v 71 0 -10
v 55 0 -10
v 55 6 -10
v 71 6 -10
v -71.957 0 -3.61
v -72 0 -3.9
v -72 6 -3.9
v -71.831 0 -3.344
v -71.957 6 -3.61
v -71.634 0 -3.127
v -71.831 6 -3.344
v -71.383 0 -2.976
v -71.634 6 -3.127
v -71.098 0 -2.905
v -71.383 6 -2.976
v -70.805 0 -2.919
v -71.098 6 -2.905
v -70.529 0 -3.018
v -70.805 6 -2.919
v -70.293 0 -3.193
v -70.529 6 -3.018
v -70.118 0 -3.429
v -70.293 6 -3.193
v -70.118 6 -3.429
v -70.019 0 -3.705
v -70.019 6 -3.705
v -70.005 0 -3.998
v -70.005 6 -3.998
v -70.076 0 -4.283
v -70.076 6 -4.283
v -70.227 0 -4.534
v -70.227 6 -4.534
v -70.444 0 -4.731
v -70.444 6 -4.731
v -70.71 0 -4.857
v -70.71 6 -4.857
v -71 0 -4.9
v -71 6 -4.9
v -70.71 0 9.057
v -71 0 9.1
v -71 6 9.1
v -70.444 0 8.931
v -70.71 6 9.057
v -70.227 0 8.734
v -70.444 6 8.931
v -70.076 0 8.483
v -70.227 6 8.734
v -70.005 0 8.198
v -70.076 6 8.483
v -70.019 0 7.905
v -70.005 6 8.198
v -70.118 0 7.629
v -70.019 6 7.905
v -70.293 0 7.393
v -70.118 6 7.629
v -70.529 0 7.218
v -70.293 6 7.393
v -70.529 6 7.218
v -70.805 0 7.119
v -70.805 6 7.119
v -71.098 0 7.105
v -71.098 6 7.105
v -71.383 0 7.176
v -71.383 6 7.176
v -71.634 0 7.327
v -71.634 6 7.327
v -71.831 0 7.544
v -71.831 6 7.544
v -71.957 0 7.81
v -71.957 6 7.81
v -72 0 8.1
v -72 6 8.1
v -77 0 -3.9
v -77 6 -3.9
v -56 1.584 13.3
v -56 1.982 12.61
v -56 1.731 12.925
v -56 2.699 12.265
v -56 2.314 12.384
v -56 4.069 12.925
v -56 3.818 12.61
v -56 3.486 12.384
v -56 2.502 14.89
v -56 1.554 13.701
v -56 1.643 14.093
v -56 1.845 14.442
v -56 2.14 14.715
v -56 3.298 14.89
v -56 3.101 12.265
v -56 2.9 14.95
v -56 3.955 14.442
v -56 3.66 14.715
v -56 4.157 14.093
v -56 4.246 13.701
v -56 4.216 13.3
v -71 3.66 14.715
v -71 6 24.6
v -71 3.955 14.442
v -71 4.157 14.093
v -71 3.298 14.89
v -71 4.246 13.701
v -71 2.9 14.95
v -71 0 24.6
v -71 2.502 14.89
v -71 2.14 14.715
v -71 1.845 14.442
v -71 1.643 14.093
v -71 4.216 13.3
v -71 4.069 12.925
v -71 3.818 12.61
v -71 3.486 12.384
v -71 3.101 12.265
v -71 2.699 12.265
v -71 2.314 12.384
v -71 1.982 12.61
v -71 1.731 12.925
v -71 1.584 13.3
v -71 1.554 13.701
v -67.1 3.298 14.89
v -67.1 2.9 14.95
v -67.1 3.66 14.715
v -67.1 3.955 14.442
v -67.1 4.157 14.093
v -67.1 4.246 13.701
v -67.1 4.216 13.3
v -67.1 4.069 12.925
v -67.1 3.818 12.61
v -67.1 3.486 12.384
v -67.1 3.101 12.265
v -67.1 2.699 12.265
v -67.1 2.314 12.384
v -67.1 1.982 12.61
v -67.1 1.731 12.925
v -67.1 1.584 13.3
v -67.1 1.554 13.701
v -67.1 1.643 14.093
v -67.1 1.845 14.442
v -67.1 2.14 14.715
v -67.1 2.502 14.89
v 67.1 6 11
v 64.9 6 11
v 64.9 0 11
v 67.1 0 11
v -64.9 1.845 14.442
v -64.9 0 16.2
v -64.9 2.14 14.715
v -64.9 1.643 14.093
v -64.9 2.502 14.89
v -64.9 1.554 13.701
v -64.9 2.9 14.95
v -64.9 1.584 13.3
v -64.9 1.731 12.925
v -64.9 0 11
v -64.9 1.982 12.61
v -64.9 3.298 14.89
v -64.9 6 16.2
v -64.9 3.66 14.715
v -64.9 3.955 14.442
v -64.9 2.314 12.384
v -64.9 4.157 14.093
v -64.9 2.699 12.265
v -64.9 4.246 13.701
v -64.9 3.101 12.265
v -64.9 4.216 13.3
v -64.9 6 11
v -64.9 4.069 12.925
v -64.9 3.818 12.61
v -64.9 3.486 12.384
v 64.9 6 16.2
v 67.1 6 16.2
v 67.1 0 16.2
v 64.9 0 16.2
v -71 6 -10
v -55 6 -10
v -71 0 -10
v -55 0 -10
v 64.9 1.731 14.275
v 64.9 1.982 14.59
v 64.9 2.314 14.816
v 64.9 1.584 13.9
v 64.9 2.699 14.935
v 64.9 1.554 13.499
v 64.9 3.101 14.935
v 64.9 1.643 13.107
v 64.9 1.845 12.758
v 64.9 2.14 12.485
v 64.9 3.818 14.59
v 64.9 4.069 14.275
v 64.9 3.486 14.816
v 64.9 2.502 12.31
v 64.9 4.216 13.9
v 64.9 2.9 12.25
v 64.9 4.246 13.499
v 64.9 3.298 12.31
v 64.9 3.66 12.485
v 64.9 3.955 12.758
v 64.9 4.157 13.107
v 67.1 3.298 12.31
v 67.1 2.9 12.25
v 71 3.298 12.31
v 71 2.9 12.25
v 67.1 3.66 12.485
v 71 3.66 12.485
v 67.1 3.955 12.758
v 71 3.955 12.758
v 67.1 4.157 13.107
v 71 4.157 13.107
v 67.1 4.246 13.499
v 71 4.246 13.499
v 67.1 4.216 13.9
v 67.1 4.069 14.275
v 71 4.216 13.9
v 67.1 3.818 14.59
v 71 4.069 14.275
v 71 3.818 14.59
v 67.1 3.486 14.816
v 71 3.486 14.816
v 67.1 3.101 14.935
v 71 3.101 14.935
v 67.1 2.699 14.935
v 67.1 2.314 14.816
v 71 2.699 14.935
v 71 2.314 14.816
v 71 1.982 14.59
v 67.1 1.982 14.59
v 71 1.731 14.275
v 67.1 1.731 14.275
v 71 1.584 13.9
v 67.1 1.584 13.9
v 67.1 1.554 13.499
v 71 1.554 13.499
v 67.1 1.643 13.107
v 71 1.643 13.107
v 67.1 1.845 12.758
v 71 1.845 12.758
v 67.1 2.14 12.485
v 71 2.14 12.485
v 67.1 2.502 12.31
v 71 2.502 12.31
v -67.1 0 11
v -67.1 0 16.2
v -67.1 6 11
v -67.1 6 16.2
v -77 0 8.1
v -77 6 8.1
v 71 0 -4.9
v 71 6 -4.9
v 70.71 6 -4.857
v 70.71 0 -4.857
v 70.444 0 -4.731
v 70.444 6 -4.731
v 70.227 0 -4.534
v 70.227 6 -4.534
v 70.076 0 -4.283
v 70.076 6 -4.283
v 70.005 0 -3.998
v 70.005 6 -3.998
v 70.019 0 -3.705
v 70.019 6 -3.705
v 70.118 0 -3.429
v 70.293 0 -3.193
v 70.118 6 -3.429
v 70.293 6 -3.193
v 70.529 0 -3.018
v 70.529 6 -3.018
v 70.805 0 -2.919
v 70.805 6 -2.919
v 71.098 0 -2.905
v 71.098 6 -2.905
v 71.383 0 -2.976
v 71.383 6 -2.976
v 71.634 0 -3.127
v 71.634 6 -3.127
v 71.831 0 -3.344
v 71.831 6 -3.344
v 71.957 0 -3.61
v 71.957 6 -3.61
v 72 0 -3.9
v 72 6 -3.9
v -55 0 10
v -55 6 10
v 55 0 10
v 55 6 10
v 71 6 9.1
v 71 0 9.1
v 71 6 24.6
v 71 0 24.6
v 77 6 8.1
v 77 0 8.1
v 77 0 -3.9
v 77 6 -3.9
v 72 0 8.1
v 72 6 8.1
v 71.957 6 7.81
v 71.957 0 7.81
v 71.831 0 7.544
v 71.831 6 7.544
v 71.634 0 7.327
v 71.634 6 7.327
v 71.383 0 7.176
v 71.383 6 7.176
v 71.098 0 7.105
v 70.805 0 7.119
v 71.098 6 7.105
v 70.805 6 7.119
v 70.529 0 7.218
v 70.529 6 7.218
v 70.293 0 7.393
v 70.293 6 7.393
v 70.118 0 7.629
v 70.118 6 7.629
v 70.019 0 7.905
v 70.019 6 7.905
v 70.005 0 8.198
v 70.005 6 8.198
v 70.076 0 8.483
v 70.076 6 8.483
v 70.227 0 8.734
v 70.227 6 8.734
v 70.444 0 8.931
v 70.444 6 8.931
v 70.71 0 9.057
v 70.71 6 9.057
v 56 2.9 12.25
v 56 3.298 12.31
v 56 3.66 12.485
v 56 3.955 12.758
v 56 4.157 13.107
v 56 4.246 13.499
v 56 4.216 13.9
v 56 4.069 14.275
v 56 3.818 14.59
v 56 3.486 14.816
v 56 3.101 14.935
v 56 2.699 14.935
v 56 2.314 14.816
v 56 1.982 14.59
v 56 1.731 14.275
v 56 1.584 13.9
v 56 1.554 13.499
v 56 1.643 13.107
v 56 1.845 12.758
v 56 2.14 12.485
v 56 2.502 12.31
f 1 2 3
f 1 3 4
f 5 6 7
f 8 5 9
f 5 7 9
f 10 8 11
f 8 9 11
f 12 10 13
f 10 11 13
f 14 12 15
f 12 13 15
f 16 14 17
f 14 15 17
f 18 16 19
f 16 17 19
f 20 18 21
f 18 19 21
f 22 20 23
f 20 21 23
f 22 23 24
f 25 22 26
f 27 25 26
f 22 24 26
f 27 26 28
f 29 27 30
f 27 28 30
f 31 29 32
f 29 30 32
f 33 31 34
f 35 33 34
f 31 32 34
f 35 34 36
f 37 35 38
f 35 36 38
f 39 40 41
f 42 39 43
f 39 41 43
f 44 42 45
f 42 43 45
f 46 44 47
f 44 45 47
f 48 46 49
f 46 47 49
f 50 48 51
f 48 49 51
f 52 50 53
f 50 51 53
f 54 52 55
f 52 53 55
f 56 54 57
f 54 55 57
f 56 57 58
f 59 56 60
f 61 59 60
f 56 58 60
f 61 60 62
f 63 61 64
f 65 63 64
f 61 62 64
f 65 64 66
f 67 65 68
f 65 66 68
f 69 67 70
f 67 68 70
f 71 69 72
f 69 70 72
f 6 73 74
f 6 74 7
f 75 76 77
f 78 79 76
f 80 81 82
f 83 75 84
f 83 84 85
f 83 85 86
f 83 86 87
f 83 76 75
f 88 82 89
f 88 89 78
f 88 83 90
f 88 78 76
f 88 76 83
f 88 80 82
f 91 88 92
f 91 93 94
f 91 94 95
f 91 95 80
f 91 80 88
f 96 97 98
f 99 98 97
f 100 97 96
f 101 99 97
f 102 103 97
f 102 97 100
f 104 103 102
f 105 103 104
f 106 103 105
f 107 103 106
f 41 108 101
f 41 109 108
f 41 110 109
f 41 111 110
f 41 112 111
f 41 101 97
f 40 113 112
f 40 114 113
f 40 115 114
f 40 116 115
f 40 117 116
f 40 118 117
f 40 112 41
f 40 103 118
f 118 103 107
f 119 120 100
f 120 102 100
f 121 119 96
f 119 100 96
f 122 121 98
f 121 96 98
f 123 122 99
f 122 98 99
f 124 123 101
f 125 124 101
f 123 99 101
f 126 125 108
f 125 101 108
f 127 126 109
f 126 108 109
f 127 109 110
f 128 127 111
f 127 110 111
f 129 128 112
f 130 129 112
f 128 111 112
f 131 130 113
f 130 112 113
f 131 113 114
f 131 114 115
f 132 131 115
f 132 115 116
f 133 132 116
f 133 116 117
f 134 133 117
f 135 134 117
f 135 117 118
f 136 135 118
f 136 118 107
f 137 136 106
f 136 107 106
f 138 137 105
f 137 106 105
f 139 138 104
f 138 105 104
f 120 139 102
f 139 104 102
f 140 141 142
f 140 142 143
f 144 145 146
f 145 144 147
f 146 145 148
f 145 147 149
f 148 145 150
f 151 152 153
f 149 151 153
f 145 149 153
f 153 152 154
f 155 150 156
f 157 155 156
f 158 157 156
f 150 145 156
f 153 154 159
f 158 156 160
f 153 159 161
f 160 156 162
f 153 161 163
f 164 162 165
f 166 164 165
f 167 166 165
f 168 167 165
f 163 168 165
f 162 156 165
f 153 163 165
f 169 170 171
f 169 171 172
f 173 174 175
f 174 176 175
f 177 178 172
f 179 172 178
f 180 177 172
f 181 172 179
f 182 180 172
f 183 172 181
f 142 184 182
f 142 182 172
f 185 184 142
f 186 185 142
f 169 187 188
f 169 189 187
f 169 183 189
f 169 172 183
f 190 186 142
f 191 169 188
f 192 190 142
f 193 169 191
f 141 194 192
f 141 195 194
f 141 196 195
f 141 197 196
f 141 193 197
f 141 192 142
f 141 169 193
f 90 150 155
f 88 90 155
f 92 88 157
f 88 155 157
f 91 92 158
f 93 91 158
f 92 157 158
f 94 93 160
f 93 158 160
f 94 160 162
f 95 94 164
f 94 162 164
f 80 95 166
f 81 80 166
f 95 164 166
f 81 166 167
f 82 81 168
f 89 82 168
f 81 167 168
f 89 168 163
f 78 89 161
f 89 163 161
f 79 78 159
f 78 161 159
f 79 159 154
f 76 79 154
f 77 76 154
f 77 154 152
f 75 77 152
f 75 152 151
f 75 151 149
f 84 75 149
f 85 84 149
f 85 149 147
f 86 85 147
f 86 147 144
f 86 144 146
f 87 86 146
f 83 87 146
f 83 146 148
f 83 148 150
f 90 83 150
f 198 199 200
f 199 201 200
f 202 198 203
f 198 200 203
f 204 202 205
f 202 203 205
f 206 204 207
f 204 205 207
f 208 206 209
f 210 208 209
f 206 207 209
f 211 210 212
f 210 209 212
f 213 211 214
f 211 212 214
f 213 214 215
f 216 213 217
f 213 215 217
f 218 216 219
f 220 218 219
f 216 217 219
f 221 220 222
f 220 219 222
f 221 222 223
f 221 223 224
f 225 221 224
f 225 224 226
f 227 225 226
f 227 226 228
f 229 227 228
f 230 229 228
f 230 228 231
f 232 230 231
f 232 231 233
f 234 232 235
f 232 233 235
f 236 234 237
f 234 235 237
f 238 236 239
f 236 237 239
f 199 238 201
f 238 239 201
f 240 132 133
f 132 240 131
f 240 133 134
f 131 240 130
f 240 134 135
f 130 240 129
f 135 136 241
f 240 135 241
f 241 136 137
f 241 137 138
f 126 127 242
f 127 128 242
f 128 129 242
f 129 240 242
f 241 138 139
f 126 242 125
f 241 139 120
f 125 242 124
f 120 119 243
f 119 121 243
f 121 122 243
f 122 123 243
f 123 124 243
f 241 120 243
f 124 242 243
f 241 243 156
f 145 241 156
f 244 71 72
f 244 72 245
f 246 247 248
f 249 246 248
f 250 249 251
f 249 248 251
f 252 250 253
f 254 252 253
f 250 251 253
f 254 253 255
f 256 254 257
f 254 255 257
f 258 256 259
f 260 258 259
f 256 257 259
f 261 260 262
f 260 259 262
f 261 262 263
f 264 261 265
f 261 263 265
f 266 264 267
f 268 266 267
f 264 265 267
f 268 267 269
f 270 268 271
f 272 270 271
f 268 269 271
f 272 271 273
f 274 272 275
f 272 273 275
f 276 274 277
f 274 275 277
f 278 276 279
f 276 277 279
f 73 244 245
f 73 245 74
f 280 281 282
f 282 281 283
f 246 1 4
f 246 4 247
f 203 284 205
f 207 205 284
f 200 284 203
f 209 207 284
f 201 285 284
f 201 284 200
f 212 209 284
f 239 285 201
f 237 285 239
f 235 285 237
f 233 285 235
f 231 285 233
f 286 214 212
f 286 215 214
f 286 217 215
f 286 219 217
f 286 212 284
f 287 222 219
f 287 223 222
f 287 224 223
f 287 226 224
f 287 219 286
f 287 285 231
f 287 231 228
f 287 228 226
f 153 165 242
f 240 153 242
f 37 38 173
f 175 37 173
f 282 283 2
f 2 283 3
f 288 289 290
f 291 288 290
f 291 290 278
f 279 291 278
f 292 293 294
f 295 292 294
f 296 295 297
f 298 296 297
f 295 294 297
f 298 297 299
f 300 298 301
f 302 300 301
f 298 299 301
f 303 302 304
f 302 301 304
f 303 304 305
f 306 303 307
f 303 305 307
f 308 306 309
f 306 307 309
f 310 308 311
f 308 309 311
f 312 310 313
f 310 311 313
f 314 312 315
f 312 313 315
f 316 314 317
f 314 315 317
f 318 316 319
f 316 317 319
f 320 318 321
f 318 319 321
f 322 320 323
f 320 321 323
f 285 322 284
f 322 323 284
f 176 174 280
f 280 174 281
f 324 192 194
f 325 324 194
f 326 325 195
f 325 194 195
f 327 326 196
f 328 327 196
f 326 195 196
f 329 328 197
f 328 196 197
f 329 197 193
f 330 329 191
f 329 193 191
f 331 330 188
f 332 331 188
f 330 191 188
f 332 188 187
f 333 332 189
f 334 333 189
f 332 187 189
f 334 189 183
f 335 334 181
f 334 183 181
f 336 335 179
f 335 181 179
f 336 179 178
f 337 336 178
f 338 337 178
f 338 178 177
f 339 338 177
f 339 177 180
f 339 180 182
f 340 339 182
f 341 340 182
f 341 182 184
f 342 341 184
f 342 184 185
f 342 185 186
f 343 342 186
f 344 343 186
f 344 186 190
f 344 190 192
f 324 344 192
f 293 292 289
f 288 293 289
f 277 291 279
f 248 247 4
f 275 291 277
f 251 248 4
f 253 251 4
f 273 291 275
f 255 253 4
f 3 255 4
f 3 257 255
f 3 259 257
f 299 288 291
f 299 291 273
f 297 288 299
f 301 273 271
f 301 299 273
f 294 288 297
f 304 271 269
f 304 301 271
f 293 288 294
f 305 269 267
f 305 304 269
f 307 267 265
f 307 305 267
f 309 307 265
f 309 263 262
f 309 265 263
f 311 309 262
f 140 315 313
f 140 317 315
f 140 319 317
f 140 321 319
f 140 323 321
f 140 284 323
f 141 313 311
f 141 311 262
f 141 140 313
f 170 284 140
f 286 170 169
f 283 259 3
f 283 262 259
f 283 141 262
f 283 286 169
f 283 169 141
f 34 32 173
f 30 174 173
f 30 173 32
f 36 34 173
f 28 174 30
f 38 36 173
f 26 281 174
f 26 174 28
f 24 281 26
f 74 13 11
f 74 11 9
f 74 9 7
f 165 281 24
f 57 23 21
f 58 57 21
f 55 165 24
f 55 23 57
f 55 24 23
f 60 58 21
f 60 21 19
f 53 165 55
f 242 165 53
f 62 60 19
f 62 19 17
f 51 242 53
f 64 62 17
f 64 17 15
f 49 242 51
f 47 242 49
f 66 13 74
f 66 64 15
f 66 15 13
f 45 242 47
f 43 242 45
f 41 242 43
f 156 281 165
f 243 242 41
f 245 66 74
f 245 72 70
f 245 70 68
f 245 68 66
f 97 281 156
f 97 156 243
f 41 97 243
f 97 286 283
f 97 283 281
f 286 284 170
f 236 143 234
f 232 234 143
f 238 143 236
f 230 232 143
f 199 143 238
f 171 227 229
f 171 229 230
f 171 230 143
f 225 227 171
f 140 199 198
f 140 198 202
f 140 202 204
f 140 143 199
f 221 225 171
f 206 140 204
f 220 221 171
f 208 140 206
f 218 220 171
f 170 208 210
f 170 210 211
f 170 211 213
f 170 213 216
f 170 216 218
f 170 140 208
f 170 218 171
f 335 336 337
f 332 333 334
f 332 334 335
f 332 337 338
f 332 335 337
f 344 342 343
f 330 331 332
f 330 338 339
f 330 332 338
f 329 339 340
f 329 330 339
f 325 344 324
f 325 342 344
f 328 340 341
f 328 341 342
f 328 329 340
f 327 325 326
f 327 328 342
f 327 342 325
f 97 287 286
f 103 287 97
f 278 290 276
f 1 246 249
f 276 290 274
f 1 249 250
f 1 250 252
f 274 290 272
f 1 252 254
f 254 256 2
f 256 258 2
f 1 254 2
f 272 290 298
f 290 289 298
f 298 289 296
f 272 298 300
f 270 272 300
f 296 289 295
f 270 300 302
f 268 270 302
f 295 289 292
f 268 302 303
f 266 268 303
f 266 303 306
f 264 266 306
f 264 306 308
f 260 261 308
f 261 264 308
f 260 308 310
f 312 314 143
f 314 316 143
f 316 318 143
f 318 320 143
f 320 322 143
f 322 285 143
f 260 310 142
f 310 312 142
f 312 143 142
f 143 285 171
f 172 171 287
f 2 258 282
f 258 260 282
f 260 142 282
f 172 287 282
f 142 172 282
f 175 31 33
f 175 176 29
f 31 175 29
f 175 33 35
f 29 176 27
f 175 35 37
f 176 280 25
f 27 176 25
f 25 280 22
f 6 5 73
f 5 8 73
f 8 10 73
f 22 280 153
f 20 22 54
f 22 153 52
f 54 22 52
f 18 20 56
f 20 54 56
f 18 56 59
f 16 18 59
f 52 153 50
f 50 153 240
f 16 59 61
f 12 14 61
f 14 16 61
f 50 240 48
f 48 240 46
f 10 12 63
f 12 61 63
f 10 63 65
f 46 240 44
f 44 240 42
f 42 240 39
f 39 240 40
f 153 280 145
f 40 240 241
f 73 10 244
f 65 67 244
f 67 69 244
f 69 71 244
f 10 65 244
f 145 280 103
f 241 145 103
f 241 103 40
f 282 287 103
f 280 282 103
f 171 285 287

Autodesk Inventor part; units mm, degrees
ref_plane "우측면도" through (0, 0, 0) normal (1, 0, 0) x (0, 1, 0)
ref_plane "평면도" through (0, 0, 0) normal (0, 1, 0) x (-1, 0, 0)
ref_plane "정면도" through (0, 0, 0) normal (0, 0, 1) x (1, 0, 0)
sketch "스케치1" plane through (0, 0, 0) normal (0, 1, 0) x (-1, 0, 0)
  line L0 (-71, 24.6) -> (71, 24.6)
  line L1 (71, 24.6) -> (71, -10)
  line L2 (-71, -10) -> (-71, 24.6)
  line L3 (-71, 24.6) -> (71, -24.6) construction
  line L4 (71, 24.6) -> (-71, -24.6) construction
  line L5 (-71, 8.1) -> (-77, 8.1)
  line L6 (-77, 8.1) -> (-77, -3.9)
  line L7 (-77, -3.9) -> (-71, -3.9)
  line L8 (-71, -3.9) -> (-71, 8.1)
  line L9 (71, 8.1) -> (77, 8.1)
  line L10 (77, 8.1) -> (77, -3.9)
  line L11 (77, -3.9) -> (71, -3.9)
  line L12 (71, -3.9) -> (71, 8.1)
  line L13 (27.5, 10) -> (-27.5, 10)
  line L14 (-27.5, 10) -> (-27.5, -10)
  line L15 (-27.5, -10) -> (27.5, -10)
  line L16 (27.5, -10) -> (27.5, 10)
  line L17 (27.5, 10) -> (-27.5, -10) construction
  line L18 (-27.5, 10) -> (27.5, -10) construction
  line L19 (27.5, -10) -> (71, -10)
  line L20 (-27.5, -10) -> (-71, -10)
  line L21 (71, -24.6) -> (67.65, -24.6)
  line L22 (-67.65, -24.6) -> (-71, -24.6)
  point P0 (0, 0)
  dimension "d0" = 142
  dimension "d1" = 49.2
  dimension "d2" = 6
  dimension "d3" = 12
  dimension "d4" = 6
  dimension "d5" = 55
  dimension "d6" = 20
extrude "돌출2" add sketch "스케치1" along normal blind 6 contours L0 L1 L19 L16 L13 L14 L20 L2 | L2 L7 L6 L5 | L9 L10 L11 L1
sketch "스케치2" plane through (0, 6, 0) normal (0, 1, 0) x (1, 0, 0)
  line L0 (-50, 10) -> (50, 10)
  line L1 (50, 10) -> (50, -10)
  line L2 (50, -10) -> (-50, -10)
  line L3 (-50, -10) -> (-50, 10)
  line L4 (-50, 10) -> (50, -10) construction
  line L5 (50, 10) -> (-50, -10) construction
  point P0 (0, 0)
  dimension "d11" = 100
  dimension "d12" = 20
extrude "돌출3" cut sketch "스케치2" against normal blind 6
sketch "스케치3" plane through (71, 0, 24.6) normal (1, 0, 0) x (0, 0, -1)
  circle A0 centre (11, 2.9) radius 1.35 projected
  circle A1 centre (11, 2.9) radius 1.35
  point P0 (24.6, 0)
extrude "돌출4" cut sketch "스케치3" against normal blind 15
sketch "스케치4" plane through (-71, 0, 8.1) normal (-1, 0, 0) x (0, 0, 1)
  circle A0 centre (5.5, 2.9) radius 1.35 projected
  circle A1 centre (5.5, 2.9) radius 1.35
  point P0 (-8.1, 0)
extrude "돌출5" cut sketch "스케치4" against normal blind 15
sketch "스케치5" plane through (0, 6, 0) normal (0, 1, 0) x (1, 0, 0)
  line L0 (71, -12.25) -> (56, -12.25) projected
  line L1 (71, -14.95) -> (56, -14.95) projected
  line L2 (-71, -12.25) -> (-56, -12.25) projected
  line L3 (-71, -14.95) -> (-56, -14.95) projected
  line L4 (-66, -12.25) -> (-66, -14.95)
  line L5 (66, -12.25) -> (66, -14.95)
  line L6 (-67.1, -16.2) -> (-64.9, -16.2)
  line L7 (-64.9, -16.2) -> (-64.9, -11)
  line L8 (-64.9, -11) -> (-67.1, -11)
  line L9 (-67.1, -11) -> (-67.1, -16.2)
  line L10 (-67.1, -16.2) -> (-64.9, -11) construction
  line L11 (-64.9, -16.2) -> (-67.1, -11) construction
  line L12 (67.1, -16.2) -> (64.9, -16.2)
  line L13 (64.9, -16.2) -> (64.9, -11)
  line L14 (64.9, -11) -> (67.1, -11)
  line L15 (67.1, -11) -> (67.1, -16.2)
  line L16 (67.1, -16.2) -> (64.9, -11) construction
  line L17 (64.9, -16.2) -> (67.1, -11) construction
  point P0 (0, 0)
  point P1 (-66, -13.6)
  point P2 (66, -13.6)
  dimension "d19" = 2.2
  dimension "d20" = 5.2
  dimension "d21" = 2.2
  dimension "d22" = 5.2
extrude "돌출6" cut sketch "스케치5" against normal blind 15
sketch "스케치6" plane through (0, 6, 0) normal (0, 1, 0) x (1, 0, 0)
  line L0 (67.1, -11) -> (67.1, -16.2) projected
  line L1 (67.1, -16.2) -> (64.9, -16.2) projected
  line L2 (64.9, -16.2) -> (64.9, -11) projected
  line L3 (64.9, -11) -> (67.1, -11) projected
  line L4 (-67.1, -16.2) -> (-67.1, -11) projected
  line L5 (-67.1, -11) -> (-64.9, -11) projected
  line L6 (-64.9, -11) -> (-64.9, -16.2) projected
  line L7 (-64.9, -16.2) -> (-67.1, -16.2) projected
  line L8 (-50, -10) -> (-50, 10) projected
  line L9 (-50, 10) -> (-71, 10) projected
  line L10 (-71, 10) -> (-71, 3.9) projected
  line L11 (-71, 3.9) -> (-77, 3.9) projected
  line L12 (-77, 3.9) -> (-77, -8.1) projected
  line L13 (-77, -8.1) -> (-71, -8.1) projected
  line L14 (-71, -8.1) -> (-71, -24.6) projected
  line L15 (-71, -24.6) -> (71, -24.6) projected
  line L16 (71, -24.6) -> (71, -8.1) projected
  line L17 (71, -8.1) -> (77, -8.1) projected
  line L18 (77, -8.1) -> (77, 3.9) projected
  line L19 (77, 3.9) -> (71, 3.9) projected
  line L20 (71, 3.9) -> (71, 10) projected
  line L21 (71, 10) -> (50, 10) projected
  line L22 (50, 10) -> (50, -10) projected
  line L23 (50, -10) -> (-50, -10) projected
  line L24 (-55, -10) -> (55, -10)
  line L25 (55, -10) -> (55, 10)
  line L26 (55, 10) -> (-55, 10)
  line L27 (-55, 10) -> (-55, -10)
  line L28 (-55, -10) -> (55, 10) construction
  line L29 (55, -10) -> (-55, 10) construction
  point P0 (0, 0)
  dimension "d25" = 110
extrude "돌출8" cut sketch "스케치6" against normal blind 10 contours L24 L27 L9 L8 | L22 L21 L25 L24
sketch "스케치7" plane through (0, 6, 0) normal (0, 1, 0) x (1, 0, 0)
  line L0 (-67.1, -16.2) -> (-67.1, -11) projected
  line L1 (-67.1, -11) -> (-64.9, -11) projected
  line L2 (-64.9, -11) -> (-64.9, -16.2) projected
  line L3 (-64.9, -16.2) -> (-67.1, -16.2) projected
  line L4 (67.1, -11) -> (67.1, -16.2) projected
  line L5 (67.1, -16.2) -> (64.9, -16.2) projected
  line L6 (64.9, -16.2) -> (64.9, -11) projected
  line L7 (64.9, -11) -> (67.1, -11) projected
  line L8 (55, 10) -> (55, -10) projected
  line L9 (55, -10) -> (-55, -10) projected
  line L10 (-55, -10) -> (-55, 10) projected
  line L11 (-55, 10) -> (-71, 10) projected
  line L12 (-71, 10) -> (-71, 3.9) projected
  line L13 (-71, 3.9) -> (-77, 3.9) projected
  line L14 (-77, 3.9) -> (-77, -8.1) projected
  line L15 (-77, -8.1) -> (-71, -8.1) projected
  line L16 (-71, -8.1) -> (-71, -24.6) projected
  line L17 (-71, -24.6) -> (71, -24.6) projected
  line L18 (71, -24.6) -> (71, -8.1) projected
  line L19 (71, -8.1) -> (77, -8.1) projected
  line L20 (77, -8.1) -> (77, 3.9) projected
  line L21 (77, 3.9) -> (71, 3.9) projected
  line L22 (71, 3.9) -> (71, 10) projected
  line L23 (71, 10) -> (55, 10) projected
  circle A0 centre (-71, 3.9) radius 1
  circle A1 centre (-71, -8.1) radius 1
  circle A2 centre (71, -8.1) radius 1
  circle A3 centre (71, 3.9) radius 1
  point P0 (0, 0)
  point P1 (72, -8.1)
  point P2 (71, -9.1)
  point P3 (71, 4.9)
  point P4 (72, 3.9)
  point P5 (-71, 4.9)
  point P6 (-72, 3.9)
  point P7 (-71, -9.1)
  point P8 (-72, -8.1)
  dimension "d30" = 2
  dimension "d31" = 2
  dimension "d32" = 2
  dimension "d33" = 2
extrude "돌출9" cut sketch "스케치7" against normal blind 10 contours L22 L21 A3 | A0 L13 L12 | L19 L18 A2 | A1 L16 L15 picked at (71.1358, 3.2525) picked at (-71.657, 3.8202) picked at (71.1358, -7.4525) picked at (-71, -7.4382)
properties part number "battery backplate" material "PMMA 플라스틱"
